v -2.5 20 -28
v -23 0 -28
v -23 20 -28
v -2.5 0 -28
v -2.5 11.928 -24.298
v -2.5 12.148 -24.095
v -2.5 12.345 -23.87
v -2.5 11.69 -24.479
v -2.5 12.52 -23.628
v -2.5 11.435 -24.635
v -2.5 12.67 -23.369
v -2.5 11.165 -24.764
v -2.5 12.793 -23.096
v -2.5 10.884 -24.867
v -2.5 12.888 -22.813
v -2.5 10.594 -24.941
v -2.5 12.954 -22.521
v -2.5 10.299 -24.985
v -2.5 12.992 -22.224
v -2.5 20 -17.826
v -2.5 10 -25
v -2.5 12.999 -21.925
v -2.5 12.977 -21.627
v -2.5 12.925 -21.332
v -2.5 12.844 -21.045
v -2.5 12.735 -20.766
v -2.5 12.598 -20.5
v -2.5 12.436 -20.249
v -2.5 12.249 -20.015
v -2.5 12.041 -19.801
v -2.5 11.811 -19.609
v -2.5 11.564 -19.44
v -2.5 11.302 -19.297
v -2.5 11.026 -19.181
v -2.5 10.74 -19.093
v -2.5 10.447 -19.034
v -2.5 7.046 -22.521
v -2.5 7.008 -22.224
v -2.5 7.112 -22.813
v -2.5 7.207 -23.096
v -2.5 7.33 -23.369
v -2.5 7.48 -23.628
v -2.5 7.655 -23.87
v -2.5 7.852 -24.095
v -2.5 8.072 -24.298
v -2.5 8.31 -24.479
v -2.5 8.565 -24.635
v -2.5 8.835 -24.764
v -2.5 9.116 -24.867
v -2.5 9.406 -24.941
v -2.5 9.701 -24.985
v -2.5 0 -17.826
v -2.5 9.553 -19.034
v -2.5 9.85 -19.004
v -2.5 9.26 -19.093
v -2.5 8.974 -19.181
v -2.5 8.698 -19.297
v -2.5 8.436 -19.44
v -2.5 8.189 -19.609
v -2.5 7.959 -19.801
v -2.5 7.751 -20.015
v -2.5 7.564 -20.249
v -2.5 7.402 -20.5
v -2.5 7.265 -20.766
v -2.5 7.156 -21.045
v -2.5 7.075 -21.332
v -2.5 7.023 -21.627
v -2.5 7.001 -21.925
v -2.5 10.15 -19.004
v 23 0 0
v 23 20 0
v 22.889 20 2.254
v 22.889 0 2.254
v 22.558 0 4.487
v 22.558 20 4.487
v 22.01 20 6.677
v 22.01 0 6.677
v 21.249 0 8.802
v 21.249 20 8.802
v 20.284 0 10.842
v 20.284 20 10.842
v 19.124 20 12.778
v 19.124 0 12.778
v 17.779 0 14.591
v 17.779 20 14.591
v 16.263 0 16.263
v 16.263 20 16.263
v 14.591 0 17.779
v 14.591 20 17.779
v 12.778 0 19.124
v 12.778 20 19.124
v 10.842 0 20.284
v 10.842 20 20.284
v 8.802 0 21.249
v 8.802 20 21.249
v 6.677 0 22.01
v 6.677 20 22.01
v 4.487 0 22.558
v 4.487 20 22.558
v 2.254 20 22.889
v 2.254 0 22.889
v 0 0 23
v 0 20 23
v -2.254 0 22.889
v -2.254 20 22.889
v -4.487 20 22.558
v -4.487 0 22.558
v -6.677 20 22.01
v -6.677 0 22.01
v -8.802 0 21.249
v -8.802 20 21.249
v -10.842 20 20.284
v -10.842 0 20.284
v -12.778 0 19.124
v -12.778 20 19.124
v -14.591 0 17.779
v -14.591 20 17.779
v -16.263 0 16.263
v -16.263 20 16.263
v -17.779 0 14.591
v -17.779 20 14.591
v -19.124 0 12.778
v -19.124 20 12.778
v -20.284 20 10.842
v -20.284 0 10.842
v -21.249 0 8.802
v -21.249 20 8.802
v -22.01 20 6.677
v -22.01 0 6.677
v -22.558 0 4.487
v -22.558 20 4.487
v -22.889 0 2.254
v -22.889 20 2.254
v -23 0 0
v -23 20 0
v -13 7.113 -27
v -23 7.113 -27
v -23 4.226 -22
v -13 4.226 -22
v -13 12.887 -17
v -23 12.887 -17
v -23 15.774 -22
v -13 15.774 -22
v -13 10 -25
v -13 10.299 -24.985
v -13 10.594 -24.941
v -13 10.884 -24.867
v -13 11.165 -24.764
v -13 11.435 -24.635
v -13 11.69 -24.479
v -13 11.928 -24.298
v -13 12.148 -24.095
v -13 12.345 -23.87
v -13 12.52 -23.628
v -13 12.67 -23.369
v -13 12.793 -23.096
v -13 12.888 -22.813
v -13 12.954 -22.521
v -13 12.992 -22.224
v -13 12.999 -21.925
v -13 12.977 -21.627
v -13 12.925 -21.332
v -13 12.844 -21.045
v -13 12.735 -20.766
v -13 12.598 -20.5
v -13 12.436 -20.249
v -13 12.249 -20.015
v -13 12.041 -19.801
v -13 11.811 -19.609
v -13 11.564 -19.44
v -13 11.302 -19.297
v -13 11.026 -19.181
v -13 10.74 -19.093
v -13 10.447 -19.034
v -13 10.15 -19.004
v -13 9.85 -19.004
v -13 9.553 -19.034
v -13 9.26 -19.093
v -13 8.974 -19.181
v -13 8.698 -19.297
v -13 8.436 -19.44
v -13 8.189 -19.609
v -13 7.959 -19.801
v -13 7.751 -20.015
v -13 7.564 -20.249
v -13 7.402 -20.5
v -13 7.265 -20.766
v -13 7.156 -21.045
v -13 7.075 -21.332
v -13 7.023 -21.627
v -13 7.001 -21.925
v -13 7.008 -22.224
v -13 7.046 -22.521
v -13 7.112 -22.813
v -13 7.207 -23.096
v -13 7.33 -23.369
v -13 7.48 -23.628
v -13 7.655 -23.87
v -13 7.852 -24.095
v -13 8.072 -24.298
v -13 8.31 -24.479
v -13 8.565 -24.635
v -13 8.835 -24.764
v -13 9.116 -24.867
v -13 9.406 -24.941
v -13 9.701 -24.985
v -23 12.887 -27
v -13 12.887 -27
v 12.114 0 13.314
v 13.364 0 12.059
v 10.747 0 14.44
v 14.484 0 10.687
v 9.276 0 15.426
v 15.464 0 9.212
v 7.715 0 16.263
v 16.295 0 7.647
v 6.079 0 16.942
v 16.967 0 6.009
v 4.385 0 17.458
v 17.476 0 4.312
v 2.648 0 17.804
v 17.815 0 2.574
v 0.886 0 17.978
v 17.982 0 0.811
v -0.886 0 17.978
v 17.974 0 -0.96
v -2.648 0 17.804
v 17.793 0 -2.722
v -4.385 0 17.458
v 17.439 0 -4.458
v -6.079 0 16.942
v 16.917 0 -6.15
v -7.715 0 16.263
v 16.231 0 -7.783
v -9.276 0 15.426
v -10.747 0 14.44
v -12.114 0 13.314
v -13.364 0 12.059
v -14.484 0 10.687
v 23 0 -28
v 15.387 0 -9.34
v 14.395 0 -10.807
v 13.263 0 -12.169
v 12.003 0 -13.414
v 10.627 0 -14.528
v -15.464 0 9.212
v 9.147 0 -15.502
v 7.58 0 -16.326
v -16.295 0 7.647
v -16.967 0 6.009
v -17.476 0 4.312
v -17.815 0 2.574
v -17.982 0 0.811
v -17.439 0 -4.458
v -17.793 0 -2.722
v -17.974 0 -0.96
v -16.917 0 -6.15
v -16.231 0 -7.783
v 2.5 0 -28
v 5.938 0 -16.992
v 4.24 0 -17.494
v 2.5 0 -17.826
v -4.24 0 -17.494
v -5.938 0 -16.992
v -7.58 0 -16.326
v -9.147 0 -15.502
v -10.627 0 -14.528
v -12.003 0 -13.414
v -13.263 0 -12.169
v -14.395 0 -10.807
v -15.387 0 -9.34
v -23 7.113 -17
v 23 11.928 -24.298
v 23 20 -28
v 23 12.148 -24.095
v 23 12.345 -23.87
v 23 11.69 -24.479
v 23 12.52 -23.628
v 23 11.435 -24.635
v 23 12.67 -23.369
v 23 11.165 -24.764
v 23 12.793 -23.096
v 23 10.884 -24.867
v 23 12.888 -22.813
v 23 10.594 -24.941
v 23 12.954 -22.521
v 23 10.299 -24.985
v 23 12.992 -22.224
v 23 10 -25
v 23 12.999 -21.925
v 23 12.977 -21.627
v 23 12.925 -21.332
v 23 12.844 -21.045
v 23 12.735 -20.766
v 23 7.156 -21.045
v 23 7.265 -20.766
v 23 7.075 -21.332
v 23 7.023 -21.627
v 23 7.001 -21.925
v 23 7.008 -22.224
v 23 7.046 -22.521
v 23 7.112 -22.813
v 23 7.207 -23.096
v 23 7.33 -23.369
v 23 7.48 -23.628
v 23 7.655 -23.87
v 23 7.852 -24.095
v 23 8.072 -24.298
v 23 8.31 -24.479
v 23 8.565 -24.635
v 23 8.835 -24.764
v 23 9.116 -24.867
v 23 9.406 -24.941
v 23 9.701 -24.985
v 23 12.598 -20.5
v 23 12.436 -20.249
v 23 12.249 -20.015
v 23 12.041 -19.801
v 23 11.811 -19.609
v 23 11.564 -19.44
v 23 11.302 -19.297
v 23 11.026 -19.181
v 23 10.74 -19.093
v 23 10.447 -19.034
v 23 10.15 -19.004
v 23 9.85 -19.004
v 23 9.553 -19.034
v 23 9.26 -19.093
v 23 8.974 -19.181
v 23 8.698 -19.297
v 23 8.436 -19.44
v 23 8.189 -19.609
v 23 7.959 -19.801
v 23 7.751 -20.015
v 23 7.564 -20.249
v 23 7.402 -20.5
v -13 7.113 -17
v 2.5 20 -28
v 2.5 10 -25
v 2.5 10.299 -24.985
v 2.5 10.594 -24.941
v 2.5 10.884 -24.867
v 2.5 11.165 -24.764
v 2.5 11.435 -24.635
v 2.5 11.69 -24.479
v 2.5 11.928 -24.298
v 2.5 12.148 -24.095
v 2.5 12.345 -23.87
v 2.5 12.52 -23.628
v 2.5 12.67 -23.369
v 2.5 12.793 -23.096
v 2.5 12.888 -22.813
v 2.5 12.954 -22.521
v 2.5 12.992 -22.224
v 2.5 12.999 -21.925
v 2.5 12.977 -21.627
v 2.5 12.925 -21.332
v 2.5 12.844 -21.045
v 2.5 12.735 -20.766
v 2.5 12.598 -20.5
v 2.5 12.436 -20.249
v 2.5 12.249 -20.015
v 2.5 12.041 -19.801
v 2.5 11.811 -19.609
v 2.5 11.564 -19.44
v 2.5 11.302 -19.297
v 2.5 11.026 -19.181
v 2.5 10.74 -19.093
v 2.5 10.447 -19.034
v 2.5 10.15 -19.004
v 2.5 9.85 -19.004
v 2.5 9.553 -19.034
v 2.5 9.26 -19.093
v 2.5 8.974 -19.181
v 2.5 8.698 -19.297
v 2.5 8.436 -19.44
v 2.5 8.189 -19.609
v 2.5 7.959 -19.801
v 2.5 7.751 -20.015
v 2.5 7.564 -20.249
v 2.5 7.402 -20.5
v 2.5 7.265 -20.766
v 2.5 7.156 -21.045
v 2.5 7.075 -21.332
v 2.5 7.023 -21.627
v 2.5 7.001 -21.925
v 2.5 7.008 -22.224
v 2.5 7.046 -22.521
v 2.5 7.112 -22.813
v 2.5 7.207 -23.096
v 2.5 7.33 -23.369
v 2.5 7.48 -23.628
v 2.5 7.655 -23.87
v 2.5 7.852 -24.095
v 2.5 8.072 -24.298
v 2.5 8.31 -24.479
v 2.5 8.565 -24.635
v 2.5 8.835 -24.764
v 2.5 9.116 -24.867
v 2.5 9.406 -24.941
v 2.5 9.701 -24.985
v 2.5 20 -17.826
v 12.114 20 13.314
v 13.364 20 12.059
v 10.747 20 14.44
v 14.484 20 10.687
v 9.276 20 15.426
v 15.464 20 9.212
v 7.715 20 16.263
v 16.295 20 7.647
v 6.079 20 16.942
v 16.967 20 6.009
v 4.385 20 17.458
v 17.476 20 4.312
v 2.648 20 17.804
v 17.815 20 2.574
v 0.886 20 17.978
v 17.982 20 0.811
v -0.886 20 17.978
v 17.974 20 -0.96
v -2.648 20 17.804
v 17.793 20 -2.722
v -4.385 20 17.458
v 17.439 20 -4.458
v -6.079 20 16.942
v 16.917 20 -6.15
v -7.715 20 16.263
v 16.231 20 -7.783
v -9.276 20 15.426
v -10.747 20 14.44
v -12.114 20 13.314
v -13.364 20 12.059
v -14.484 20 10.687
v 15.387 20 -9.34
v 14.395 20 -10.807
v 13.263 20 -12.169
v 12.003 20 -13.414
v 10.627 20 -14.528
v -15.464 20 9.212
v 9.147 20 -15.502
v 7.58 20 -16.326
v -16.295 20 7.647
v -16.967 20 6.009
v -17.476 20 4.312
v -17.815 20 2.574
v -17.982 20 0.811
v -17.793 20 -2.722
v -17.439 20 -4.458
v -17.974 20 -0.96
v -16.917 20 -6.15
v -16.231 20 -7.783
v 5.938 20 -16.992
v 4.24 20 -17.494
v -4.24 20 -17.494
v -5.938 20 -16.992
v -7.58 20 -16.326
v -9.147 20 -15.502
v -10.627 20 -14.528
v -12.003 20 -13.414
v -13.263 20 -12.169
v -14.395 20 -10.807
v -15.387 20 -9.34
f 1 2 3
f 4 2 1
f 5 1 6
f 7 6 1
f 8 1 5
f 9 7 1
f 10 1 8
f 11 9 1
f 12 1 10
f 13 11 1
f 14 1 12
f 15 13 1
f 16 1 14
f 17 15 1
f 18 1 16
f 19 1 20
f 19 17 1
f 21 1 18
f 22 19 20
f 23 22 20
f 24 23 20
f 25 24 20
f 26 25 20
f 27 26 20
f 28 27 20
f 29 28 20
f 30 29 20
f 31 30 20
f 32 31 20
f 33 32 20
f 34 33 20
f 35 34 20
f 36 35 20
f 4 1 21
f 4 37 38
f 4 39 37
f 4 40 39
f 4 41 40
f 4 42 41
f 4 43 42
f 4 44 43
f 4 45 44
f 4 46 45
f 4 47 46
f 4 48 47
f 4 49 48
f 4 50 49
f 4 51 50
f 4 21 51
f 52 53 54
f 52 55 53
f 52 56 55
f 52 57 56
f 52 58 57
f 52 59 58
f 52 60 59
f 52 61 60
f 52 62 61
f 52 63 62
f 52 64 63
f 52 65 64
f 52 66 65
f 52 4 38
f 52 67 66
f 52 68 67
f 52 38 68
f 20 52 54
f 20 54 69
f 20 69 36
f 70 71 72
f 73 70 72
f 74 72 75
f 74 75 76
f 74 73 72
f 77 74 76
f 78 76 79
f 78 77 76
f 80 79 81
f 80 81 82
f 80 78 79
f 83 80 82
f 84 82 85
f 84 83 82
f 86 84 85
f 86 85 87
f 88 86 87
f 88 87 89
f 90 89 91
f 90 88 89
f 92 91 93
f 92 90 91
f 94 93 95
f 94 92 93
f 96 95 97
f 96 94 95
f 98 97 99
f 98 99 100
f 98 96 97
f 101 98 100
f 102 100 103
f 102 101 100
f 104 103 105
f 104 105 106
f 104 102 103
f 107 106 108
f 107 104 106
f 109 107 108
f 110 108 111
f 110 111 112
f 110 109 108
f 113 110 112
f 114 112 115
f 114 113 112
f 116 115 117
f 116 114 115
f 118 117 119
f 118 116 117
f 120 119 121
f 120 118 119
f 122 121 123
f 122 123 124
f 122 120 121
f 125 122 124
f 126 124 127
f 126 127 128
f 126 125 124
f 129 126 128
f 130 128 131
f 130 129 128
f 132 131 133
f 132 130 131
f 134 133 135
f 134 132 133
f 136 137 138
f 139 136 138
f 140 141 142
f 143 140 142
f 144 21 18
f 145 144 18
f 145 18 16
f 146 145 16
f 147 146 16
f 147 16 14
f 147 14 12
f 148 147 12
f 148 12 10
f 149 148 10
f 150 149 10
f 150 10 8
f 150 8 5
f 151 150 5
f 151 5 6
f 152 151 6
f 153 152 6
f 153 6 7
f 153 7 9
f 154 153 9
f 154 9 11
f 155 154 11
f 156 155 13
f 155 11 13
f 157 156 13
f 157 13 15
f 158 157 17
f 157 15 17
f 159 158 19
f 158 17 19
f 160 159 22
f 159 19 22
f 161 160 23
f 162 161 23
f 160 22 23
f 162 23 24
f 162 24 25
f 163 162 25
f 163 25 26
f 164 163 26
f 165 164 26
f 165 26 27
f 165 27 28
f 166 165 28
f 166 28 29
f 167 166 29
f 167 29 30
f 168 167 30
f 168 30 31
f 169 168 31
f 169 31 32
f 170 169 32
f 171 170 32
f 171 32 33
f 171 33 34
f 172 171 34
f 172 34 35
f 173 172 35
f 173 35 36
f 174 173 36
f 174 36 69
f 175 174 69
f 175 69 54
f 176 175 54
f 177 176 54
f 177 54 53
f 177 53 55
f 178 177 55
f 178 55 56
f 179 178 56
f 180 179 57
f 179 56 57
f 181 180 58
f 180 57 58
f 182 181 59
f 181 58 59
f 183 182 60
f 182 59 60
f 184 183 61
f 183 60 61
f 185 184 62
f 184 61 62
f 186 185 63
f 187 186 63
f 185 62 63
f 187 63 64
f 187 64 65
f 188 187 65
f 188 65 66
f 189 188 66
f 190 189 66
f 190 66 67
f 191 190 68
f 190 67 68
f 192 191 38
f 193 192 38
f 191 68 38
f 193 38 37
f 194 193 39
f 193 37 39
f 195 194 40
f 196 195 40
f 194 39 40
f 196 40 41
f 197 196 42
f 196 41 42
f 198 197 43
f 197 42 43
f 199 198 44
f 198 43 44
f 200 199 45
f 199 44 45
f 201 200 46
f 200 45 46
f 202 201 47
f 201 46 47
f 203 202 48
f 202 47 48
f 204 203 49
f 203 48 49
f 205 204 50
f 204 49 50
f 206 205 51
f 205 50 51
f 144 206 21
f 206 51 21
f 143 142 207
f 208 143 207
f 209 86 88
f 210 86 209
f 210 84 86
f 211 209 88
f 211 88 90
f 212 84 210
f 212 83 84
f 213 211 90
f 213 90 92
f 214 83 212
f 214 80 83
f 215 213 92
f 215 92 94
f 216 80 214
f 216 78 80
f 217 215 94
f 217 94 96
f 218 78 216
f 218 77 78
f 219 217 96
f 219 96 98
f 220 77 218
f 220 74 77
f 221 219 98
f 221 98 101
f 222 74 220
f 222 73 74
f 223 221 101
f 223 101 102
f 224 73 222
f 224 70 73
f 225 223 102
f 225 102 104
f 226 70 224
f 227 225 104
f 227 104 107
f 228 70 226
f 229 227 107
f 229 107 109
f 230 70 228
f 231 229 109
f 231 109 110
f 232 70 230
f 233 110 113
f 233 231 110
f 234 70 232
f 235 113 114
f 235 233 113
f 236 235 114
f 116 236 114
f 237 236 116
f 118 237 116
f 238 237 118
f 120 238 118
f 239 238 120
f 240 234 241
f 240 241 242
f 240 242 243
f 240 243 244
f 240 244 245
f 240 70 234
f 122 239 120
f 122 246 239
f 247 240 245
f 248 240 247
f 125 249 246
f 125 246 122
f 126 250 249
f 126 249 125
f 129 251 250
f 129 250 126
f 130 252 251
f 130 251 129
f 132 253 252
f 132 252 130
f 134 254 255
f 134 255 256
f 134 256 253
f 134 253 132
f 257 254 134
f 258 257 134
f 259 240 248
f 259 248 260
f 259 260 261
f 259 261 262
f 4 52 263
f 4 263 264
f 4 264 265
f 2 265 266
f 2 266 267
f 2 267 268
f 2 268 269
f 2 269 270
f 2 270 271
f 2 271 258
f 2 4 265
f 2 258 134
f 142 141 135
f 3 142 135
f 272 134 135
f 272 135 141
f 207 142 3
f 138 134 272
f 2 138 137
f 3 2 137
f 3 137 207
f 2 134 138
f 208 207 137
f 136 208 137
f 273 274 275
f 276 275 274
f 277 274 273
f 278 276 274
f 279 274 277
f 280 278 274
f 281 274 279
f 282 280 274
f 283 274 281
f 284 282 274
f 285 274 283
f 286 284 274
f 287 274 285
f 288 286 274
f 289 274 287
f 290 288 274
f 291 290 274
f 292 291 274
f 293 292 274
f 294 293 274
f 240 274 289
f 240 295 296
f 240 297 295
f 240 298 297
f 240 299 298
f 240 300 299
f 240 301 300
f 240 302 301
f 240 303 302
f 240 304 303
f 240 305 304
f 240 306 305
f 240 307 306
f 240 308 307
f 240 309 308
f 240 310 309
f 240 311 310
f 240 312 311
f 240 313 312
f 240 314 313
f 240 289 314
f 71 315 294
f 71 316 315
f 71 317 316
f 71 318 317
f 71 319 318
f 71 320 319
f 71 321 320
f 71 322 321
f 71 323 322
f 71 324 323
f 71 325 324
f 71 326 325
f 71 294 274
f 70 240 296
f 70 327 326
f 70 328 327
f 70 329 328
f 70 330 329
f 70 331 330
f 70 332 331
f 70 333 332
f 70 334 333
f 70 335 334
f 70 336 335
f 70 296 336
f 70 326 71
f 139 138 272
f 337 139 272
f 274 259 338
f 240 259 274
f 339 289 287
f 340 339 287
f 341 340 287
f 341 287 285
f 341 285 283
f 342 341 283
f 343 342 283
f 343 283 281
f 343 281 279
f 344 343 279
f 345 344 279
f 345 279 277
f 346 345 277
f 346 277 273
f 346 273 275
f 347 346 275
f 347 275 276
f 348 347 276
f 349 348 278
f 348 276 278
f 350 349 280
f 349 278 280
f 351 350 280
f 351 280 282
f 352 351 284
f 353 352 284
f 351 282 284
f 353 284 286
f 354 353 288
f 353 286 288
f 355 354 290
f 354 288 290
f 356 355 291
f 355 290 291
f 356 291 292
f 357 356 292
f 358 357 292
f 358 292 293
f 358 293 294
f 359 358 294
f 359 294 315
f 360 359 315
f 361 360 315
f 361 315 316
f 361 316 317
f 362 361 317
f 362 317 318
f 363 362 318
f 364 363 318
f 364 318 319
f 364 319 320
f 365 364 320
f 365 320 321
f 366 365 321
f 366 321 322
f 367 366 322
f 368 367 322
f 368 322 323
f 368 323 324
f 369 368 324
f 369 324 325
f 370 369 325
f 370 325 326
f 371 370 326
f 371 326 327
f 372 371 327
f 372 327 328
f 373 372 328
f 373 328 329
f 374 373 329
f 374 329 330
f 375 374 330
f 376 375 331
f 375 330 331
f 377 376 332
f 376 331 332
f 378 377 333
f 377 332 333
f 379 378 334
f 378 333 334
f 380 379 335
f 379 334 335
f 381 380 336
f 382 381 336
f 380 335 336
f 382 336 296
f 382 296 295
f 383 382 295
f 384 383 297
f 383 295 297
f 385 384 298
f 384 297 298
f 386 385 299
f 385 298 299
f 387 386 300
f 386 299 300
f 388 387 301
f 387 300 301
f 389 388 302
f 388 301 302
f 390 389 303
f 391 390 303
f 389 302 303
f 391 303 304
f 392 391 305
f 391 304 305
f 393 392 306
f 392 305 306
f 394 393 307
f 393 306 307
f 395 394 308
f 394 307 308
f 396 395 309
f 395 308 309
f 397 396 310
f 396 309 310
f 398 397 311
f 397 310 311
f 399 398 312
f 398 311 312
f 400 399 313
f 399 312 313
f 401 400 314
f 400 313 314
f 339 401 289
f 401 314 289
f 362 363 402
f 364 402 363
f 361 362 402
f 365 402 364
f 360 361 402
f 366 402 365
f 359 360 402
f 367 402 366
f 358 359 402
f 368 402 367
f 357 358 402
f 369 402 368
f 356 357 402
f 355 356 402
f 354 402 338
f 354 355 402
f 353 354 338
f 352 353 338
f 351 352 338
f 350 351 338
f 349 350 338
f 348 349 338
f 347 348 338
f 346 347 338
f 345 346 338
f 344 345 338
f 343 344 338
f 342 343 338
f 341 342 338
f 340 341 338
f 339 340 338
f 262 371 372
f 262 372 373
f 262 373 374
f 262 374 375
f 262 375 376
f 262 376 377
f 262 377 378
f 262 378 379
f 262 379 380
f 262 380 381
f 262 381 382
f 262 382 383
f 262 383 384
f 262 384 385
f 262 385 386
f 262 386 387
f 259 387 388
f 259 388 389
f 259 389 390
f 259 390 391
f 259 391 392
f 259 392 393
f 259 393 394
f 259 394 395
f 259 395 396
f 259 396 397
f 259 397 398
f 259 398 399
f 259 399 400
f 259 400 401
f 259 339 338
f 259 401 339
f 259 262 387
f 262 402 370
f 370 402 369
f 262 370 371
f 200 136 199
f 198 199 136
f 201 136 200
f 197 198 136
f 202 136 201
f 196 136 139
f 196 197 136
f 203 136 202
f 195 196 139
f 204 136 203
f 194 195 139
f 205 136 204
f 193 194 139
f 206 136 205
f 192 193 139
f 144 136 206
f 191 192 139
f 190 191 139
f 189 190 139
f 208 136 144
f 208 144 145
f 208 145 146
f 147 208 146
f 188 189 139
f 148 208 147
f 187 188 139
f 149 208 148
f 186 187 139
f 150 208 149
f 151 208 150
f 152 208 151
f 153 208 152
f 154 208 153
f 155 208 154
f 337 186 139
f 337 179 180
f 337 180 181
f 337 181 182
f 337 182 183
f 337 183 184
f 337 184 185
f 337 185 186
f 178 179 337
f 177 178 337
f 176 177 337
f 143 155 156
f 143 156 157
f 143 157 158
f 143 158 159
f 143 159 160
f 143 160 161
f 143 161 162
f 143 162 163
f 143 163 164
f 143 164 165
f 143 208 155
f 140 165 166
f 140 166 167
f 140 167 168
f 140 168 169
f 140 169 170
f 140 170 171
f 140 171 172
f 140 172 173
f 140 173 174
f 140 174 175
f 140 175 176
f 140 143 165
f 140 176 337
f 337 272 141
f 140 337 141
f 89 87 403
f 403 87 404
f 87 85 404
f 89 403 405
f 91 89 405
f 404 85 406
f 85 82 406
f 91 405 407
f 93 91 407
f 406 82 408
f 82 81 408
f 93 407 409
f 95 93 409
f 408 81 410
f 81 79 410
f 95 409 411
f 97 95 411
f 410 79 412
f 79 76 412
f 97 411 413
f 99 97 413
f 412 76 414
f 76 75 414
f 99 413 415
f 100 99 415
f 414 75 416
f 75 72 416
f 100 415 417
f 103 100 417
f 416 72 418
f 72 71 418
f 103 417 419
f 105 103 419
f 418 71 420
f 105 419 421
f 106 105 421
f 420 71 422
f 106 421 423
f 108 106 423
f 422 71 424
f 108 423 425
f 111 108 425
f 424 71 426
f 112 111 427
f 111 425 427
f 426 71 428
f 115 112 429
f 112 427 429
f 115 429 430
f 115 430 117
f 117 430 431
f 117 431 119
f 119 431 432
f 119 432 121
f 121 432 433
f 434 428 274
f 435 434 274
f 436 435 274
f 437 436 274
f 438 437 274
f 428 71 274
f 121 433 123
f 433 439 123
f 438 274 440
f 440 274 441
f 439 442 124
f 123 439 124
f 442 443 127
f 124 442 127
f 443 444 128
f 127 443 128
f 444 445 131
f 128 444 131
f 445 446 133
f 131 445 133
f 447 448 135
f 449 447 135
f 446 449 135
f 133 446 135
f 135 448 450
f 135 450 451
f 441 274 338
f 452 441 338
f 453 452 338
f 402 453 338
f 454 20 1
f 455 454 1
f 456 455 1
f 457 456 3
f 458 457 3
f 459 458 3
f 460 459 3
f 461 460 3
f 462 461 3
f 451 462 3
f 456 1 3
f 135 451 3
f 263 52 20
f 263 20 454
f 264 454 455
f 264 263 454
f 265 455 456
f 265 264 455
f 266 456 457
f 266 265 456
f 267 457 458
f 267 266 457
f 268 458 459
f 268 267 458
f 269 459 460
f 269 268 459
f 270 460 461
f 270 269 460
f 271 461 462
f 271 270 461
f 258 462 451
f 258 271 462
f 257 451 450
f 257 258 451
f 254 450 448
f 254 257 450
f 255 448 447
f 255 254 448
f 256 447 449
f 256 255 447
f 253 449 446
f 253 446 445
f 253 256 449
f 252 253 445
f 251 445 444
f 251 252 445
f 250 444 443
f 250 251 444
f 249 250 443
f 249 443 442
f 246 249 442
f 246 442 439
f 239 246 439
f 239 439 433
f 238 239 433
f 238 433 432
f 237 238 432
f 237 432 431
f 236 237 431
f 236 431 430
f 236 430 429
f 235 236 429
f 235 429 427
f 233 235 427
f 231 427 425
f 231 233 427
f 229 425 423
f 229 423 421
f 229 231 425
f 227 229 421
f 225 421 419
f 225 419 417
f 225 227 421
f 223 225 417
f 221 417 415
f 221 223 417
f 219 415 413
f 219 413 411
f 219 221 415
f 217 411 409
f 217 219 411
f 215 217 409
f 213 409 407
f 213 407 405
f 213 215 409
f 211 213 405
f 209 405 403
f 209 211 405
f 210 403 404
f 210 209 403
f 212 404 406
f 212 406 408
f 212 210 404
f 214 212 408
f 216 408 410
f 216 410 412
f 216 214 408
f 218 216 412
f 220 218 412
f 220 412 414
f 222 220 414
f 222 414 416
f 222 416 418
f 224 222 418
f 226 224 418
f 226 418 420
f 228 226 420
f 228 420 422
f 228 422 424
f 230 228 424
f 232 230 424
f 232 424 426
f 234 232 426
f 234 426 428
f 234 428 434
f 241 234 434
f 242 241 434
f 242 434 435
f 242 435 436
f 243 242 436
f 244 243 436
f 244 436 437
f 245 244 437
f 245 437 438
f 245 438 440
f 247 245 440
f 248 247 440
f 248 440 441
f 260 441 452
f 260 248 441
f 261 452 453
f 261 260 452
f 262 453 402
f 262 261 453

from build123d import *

# Parameters (mm, degrees)
BOSS_EXTRU_1_DEPTH      = 20
ESQUISSE2_R             = 3
ENL_V_MAT_EXTRU_1_DEPTH = 47
ENL_V_MAT_EXTRU_2_DEPTH = 10


with BuildPart() as part:
    # Esquisse1 → Boss.-Extru.1 (new body)
    with BuildSketch(Plane(origin=(0, 0, 0), x_dir=(1, 0, 0), z_dir=(0, 1, 0))):
        with BuildLine():
            Line((-23, 0), (-23, 28))
            Line((-23, 28), (-2.5, 28))
            Line((-2.5, 28), (-2.5, 17.82554347))
            ThreePointArc((-2.5, 17.82554347), (0, -18), (2.5, 17.82554347))
            Line((2.5, 17.82554347), (2.5, 28))
            Line((2.5, 28), (23, 28))
            Line((23, 28), (23, 0))
            ThreePointArc((23, 0), (0, -23), (-23, 0))
        make_face()
    extrude(amount=BOSS_EXTRU_1_DEPTH)

    # Esquisse2 → Enlèv. mat.-Extru.1 (cut, through all)
    with BuildSketch(Plane(origin=(23, 0, 0), x_dir=(0, 0, -1), z_dir=(1, 0, 0))):
        with Locations((22, 10)):
            Circle(ESQUISSE2_R)
    extrude(amount=-ENL_V_MAT_EXTRU_1_DEPTH, mode=Mode.SUBTRACT)

    # Esquisse3 → Enlèv. mat.-Extru.2 (cut)
    with BuildSketch(Plane.ZY.offset(23)):
        Polygon((-22, 4.226497308), (-17, 7.113248654), (-17, 12.886751346), (-22, 15.773502692), (-27, 12.886751346), (-27, 7.113248654), align=None)
    extrude(amount=-ENL_V_MAT_EXTRU_2_DEPTH, mode=Mode.SUBTRACT)


solid = part.part
